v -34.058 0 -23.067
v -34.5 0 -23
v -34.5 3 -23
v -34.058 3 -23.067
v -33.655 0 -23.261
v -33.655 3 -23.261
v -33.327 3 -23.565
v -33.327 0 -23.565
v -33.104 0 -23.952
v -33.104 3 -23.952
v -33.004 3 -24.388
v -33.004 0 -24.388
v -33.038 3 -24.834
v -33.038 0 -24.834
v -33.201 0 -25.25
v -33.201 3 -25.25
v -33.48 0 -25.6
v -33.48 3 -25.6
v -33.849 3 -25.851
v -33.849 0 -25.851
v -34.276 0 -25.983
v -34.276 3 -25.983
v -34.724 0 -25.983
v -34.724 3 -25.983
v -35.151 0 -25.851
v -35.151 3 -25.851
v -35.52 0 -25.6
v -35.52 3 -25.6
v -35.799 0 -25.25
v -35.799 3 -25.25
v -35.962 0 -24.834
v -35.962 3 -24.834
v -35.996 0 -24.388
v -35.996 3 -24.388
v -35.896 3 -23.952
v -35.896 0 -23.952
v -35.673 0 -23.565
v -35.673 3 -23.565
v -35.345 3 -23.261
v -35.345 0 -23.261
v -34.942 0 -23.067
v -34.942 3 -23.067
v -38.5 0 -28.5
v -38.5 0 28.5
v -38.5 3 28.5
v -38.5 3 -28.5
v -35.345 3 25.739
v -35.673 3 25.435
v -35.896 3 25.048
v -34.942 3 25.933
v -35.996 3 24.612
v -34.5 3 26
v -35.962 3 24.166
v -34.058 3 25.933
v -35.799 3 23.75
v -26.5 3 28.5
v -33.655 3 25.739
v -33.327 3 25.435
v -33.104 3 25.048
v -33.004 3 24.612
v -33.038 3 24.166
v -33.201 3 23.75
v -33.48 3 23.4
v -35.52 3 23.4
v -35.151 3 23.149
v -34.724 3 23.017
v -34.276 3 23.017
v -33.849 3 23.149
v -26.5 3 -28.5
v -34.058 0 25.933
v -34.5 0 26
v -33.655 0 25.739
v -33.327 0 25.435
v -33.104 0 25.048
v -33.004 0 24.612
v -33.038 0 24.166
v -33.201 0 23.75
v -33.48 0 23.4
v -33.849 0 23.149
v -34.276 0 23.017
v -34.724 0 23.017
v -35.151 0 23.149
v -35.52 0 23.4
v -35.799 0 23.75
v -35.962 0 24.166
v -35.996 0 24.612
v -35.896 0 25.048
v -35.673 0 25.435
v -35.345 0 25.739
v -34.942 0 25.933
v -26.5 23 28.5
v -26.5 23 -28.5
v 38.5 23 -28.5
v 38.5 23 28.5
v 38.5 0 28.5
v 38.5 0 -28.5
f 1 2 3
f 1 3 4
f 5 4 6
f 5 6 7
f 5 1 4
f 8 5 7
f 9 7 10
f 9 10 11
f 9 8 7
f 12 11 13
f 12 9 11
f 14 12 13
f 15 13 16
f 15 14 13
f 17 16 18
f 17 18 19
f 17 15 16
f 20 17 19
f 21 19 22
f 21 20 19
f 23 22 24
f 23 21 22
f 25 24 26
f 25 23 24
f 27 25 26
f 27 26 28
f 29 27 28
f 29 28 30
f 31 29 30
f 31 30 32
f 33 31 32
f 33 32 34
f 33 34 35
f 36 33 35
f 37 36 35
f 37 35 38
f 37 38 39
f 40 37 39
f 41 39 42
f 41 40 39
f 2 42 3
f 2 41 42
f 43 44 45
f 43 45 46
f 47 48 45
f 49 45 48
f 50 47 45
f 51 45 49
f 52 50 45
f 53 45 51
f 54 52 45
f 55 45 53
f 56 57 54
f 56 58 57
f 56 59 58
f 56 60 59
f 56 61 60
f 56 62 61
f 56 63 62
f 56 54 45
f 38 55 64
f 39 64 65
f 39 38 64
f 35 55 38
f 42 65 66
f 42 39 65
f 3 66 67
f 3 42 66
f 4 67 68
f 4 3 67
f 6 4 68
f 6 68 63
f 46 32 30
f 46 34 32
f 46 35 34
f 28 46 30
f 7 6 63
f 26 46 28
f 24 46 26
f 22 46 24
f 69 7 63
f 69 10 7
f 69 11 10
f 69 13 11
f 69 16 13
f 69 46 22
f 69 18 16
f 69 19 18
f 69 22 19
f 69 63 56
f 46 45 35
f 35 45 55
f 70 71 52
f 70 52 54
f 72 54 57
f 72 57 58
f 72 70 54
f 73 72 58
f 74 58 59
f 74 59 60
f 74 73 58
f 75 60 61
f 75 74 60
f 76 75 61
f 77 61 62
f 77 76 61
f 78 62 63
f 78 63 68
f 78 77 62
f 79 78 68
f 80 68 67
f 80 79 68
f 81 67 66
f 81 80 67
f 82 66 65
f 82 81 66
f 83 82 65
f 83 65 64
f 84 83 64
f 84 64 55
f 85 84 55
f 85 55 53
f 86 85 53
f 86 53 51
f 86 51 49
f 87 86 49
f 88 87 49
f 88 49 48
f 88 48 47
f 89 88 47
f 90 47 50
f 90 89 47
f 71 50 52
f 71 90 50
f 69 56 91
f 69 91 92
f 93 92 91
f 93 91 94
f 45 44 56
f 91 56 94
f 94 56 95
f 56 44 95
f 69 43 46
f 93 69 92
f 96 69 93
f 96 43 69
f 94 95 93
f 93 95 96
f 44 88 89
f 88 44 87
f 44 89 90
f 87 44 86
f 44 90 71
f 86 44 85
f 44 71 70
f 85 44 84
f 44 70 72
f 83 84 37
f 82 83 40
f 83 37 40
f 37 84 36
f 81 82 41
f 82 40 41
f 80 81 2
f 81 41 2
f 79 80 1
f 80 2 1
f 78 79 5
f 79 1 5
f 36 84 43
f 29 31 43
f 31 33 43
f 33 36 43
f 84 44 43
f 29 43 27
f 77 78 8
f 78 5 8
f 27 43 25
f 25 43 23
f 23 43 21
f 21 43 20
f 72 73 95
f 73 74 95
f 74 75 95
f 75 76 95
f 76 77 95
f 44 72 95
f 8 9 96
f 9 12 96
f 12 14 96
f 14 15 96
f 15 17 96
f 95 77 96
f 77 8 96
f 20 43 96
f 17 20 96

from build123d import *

# Parameters (mm, degrees)
SKETCH1_W           = 77
SKETCH1_H           = 57
SKETCH1_R           = 1.5
BOSS_EXTRUDE1_DEPTH = 3
SKETCH2_W           = 65
SKETCH2_H           = 57
BOSS_EXTRUDE2_DEPTH = 20


with BuildPart() as part:
    # Sketch1 → Boss-Extrude1 (new body)
    with BuildSketch(Plane(origin=(0, 0, 0), x_dir=(1, 0, 0), z_dir=(0, 1, 0))):
        Rectangle(SKETCH1_W, SKETCH1_H)
        with Locations(Location((-34.5, 24.5, 0), (0, 0, 270))):
            Circle(SKETCH1_R, mode=Mode.SUBTRACT)
        with Locations(Location((-34.5, -24.5, 0), (0, 0, 270))):
            Circle(SKETCH1_R, mode=Mode.SUBTRACT)
    extrude(amount=BOSS_EXTRUDE1_DEPTH)

    # Sketch2 → Boss-Extrude2 (add)
    with BuildSketch(Plane(origin=(0, 3, 0), x_dir=(1, 0, 0), z_dir=(0, 1, 0))):
        with Locations((6, 0)):
            Rectangle(SKETCH2_W, SKETCH2_H)
    extrude(amount=BOSS_EXTRUDE2_DEPTH)


solid = part.part
